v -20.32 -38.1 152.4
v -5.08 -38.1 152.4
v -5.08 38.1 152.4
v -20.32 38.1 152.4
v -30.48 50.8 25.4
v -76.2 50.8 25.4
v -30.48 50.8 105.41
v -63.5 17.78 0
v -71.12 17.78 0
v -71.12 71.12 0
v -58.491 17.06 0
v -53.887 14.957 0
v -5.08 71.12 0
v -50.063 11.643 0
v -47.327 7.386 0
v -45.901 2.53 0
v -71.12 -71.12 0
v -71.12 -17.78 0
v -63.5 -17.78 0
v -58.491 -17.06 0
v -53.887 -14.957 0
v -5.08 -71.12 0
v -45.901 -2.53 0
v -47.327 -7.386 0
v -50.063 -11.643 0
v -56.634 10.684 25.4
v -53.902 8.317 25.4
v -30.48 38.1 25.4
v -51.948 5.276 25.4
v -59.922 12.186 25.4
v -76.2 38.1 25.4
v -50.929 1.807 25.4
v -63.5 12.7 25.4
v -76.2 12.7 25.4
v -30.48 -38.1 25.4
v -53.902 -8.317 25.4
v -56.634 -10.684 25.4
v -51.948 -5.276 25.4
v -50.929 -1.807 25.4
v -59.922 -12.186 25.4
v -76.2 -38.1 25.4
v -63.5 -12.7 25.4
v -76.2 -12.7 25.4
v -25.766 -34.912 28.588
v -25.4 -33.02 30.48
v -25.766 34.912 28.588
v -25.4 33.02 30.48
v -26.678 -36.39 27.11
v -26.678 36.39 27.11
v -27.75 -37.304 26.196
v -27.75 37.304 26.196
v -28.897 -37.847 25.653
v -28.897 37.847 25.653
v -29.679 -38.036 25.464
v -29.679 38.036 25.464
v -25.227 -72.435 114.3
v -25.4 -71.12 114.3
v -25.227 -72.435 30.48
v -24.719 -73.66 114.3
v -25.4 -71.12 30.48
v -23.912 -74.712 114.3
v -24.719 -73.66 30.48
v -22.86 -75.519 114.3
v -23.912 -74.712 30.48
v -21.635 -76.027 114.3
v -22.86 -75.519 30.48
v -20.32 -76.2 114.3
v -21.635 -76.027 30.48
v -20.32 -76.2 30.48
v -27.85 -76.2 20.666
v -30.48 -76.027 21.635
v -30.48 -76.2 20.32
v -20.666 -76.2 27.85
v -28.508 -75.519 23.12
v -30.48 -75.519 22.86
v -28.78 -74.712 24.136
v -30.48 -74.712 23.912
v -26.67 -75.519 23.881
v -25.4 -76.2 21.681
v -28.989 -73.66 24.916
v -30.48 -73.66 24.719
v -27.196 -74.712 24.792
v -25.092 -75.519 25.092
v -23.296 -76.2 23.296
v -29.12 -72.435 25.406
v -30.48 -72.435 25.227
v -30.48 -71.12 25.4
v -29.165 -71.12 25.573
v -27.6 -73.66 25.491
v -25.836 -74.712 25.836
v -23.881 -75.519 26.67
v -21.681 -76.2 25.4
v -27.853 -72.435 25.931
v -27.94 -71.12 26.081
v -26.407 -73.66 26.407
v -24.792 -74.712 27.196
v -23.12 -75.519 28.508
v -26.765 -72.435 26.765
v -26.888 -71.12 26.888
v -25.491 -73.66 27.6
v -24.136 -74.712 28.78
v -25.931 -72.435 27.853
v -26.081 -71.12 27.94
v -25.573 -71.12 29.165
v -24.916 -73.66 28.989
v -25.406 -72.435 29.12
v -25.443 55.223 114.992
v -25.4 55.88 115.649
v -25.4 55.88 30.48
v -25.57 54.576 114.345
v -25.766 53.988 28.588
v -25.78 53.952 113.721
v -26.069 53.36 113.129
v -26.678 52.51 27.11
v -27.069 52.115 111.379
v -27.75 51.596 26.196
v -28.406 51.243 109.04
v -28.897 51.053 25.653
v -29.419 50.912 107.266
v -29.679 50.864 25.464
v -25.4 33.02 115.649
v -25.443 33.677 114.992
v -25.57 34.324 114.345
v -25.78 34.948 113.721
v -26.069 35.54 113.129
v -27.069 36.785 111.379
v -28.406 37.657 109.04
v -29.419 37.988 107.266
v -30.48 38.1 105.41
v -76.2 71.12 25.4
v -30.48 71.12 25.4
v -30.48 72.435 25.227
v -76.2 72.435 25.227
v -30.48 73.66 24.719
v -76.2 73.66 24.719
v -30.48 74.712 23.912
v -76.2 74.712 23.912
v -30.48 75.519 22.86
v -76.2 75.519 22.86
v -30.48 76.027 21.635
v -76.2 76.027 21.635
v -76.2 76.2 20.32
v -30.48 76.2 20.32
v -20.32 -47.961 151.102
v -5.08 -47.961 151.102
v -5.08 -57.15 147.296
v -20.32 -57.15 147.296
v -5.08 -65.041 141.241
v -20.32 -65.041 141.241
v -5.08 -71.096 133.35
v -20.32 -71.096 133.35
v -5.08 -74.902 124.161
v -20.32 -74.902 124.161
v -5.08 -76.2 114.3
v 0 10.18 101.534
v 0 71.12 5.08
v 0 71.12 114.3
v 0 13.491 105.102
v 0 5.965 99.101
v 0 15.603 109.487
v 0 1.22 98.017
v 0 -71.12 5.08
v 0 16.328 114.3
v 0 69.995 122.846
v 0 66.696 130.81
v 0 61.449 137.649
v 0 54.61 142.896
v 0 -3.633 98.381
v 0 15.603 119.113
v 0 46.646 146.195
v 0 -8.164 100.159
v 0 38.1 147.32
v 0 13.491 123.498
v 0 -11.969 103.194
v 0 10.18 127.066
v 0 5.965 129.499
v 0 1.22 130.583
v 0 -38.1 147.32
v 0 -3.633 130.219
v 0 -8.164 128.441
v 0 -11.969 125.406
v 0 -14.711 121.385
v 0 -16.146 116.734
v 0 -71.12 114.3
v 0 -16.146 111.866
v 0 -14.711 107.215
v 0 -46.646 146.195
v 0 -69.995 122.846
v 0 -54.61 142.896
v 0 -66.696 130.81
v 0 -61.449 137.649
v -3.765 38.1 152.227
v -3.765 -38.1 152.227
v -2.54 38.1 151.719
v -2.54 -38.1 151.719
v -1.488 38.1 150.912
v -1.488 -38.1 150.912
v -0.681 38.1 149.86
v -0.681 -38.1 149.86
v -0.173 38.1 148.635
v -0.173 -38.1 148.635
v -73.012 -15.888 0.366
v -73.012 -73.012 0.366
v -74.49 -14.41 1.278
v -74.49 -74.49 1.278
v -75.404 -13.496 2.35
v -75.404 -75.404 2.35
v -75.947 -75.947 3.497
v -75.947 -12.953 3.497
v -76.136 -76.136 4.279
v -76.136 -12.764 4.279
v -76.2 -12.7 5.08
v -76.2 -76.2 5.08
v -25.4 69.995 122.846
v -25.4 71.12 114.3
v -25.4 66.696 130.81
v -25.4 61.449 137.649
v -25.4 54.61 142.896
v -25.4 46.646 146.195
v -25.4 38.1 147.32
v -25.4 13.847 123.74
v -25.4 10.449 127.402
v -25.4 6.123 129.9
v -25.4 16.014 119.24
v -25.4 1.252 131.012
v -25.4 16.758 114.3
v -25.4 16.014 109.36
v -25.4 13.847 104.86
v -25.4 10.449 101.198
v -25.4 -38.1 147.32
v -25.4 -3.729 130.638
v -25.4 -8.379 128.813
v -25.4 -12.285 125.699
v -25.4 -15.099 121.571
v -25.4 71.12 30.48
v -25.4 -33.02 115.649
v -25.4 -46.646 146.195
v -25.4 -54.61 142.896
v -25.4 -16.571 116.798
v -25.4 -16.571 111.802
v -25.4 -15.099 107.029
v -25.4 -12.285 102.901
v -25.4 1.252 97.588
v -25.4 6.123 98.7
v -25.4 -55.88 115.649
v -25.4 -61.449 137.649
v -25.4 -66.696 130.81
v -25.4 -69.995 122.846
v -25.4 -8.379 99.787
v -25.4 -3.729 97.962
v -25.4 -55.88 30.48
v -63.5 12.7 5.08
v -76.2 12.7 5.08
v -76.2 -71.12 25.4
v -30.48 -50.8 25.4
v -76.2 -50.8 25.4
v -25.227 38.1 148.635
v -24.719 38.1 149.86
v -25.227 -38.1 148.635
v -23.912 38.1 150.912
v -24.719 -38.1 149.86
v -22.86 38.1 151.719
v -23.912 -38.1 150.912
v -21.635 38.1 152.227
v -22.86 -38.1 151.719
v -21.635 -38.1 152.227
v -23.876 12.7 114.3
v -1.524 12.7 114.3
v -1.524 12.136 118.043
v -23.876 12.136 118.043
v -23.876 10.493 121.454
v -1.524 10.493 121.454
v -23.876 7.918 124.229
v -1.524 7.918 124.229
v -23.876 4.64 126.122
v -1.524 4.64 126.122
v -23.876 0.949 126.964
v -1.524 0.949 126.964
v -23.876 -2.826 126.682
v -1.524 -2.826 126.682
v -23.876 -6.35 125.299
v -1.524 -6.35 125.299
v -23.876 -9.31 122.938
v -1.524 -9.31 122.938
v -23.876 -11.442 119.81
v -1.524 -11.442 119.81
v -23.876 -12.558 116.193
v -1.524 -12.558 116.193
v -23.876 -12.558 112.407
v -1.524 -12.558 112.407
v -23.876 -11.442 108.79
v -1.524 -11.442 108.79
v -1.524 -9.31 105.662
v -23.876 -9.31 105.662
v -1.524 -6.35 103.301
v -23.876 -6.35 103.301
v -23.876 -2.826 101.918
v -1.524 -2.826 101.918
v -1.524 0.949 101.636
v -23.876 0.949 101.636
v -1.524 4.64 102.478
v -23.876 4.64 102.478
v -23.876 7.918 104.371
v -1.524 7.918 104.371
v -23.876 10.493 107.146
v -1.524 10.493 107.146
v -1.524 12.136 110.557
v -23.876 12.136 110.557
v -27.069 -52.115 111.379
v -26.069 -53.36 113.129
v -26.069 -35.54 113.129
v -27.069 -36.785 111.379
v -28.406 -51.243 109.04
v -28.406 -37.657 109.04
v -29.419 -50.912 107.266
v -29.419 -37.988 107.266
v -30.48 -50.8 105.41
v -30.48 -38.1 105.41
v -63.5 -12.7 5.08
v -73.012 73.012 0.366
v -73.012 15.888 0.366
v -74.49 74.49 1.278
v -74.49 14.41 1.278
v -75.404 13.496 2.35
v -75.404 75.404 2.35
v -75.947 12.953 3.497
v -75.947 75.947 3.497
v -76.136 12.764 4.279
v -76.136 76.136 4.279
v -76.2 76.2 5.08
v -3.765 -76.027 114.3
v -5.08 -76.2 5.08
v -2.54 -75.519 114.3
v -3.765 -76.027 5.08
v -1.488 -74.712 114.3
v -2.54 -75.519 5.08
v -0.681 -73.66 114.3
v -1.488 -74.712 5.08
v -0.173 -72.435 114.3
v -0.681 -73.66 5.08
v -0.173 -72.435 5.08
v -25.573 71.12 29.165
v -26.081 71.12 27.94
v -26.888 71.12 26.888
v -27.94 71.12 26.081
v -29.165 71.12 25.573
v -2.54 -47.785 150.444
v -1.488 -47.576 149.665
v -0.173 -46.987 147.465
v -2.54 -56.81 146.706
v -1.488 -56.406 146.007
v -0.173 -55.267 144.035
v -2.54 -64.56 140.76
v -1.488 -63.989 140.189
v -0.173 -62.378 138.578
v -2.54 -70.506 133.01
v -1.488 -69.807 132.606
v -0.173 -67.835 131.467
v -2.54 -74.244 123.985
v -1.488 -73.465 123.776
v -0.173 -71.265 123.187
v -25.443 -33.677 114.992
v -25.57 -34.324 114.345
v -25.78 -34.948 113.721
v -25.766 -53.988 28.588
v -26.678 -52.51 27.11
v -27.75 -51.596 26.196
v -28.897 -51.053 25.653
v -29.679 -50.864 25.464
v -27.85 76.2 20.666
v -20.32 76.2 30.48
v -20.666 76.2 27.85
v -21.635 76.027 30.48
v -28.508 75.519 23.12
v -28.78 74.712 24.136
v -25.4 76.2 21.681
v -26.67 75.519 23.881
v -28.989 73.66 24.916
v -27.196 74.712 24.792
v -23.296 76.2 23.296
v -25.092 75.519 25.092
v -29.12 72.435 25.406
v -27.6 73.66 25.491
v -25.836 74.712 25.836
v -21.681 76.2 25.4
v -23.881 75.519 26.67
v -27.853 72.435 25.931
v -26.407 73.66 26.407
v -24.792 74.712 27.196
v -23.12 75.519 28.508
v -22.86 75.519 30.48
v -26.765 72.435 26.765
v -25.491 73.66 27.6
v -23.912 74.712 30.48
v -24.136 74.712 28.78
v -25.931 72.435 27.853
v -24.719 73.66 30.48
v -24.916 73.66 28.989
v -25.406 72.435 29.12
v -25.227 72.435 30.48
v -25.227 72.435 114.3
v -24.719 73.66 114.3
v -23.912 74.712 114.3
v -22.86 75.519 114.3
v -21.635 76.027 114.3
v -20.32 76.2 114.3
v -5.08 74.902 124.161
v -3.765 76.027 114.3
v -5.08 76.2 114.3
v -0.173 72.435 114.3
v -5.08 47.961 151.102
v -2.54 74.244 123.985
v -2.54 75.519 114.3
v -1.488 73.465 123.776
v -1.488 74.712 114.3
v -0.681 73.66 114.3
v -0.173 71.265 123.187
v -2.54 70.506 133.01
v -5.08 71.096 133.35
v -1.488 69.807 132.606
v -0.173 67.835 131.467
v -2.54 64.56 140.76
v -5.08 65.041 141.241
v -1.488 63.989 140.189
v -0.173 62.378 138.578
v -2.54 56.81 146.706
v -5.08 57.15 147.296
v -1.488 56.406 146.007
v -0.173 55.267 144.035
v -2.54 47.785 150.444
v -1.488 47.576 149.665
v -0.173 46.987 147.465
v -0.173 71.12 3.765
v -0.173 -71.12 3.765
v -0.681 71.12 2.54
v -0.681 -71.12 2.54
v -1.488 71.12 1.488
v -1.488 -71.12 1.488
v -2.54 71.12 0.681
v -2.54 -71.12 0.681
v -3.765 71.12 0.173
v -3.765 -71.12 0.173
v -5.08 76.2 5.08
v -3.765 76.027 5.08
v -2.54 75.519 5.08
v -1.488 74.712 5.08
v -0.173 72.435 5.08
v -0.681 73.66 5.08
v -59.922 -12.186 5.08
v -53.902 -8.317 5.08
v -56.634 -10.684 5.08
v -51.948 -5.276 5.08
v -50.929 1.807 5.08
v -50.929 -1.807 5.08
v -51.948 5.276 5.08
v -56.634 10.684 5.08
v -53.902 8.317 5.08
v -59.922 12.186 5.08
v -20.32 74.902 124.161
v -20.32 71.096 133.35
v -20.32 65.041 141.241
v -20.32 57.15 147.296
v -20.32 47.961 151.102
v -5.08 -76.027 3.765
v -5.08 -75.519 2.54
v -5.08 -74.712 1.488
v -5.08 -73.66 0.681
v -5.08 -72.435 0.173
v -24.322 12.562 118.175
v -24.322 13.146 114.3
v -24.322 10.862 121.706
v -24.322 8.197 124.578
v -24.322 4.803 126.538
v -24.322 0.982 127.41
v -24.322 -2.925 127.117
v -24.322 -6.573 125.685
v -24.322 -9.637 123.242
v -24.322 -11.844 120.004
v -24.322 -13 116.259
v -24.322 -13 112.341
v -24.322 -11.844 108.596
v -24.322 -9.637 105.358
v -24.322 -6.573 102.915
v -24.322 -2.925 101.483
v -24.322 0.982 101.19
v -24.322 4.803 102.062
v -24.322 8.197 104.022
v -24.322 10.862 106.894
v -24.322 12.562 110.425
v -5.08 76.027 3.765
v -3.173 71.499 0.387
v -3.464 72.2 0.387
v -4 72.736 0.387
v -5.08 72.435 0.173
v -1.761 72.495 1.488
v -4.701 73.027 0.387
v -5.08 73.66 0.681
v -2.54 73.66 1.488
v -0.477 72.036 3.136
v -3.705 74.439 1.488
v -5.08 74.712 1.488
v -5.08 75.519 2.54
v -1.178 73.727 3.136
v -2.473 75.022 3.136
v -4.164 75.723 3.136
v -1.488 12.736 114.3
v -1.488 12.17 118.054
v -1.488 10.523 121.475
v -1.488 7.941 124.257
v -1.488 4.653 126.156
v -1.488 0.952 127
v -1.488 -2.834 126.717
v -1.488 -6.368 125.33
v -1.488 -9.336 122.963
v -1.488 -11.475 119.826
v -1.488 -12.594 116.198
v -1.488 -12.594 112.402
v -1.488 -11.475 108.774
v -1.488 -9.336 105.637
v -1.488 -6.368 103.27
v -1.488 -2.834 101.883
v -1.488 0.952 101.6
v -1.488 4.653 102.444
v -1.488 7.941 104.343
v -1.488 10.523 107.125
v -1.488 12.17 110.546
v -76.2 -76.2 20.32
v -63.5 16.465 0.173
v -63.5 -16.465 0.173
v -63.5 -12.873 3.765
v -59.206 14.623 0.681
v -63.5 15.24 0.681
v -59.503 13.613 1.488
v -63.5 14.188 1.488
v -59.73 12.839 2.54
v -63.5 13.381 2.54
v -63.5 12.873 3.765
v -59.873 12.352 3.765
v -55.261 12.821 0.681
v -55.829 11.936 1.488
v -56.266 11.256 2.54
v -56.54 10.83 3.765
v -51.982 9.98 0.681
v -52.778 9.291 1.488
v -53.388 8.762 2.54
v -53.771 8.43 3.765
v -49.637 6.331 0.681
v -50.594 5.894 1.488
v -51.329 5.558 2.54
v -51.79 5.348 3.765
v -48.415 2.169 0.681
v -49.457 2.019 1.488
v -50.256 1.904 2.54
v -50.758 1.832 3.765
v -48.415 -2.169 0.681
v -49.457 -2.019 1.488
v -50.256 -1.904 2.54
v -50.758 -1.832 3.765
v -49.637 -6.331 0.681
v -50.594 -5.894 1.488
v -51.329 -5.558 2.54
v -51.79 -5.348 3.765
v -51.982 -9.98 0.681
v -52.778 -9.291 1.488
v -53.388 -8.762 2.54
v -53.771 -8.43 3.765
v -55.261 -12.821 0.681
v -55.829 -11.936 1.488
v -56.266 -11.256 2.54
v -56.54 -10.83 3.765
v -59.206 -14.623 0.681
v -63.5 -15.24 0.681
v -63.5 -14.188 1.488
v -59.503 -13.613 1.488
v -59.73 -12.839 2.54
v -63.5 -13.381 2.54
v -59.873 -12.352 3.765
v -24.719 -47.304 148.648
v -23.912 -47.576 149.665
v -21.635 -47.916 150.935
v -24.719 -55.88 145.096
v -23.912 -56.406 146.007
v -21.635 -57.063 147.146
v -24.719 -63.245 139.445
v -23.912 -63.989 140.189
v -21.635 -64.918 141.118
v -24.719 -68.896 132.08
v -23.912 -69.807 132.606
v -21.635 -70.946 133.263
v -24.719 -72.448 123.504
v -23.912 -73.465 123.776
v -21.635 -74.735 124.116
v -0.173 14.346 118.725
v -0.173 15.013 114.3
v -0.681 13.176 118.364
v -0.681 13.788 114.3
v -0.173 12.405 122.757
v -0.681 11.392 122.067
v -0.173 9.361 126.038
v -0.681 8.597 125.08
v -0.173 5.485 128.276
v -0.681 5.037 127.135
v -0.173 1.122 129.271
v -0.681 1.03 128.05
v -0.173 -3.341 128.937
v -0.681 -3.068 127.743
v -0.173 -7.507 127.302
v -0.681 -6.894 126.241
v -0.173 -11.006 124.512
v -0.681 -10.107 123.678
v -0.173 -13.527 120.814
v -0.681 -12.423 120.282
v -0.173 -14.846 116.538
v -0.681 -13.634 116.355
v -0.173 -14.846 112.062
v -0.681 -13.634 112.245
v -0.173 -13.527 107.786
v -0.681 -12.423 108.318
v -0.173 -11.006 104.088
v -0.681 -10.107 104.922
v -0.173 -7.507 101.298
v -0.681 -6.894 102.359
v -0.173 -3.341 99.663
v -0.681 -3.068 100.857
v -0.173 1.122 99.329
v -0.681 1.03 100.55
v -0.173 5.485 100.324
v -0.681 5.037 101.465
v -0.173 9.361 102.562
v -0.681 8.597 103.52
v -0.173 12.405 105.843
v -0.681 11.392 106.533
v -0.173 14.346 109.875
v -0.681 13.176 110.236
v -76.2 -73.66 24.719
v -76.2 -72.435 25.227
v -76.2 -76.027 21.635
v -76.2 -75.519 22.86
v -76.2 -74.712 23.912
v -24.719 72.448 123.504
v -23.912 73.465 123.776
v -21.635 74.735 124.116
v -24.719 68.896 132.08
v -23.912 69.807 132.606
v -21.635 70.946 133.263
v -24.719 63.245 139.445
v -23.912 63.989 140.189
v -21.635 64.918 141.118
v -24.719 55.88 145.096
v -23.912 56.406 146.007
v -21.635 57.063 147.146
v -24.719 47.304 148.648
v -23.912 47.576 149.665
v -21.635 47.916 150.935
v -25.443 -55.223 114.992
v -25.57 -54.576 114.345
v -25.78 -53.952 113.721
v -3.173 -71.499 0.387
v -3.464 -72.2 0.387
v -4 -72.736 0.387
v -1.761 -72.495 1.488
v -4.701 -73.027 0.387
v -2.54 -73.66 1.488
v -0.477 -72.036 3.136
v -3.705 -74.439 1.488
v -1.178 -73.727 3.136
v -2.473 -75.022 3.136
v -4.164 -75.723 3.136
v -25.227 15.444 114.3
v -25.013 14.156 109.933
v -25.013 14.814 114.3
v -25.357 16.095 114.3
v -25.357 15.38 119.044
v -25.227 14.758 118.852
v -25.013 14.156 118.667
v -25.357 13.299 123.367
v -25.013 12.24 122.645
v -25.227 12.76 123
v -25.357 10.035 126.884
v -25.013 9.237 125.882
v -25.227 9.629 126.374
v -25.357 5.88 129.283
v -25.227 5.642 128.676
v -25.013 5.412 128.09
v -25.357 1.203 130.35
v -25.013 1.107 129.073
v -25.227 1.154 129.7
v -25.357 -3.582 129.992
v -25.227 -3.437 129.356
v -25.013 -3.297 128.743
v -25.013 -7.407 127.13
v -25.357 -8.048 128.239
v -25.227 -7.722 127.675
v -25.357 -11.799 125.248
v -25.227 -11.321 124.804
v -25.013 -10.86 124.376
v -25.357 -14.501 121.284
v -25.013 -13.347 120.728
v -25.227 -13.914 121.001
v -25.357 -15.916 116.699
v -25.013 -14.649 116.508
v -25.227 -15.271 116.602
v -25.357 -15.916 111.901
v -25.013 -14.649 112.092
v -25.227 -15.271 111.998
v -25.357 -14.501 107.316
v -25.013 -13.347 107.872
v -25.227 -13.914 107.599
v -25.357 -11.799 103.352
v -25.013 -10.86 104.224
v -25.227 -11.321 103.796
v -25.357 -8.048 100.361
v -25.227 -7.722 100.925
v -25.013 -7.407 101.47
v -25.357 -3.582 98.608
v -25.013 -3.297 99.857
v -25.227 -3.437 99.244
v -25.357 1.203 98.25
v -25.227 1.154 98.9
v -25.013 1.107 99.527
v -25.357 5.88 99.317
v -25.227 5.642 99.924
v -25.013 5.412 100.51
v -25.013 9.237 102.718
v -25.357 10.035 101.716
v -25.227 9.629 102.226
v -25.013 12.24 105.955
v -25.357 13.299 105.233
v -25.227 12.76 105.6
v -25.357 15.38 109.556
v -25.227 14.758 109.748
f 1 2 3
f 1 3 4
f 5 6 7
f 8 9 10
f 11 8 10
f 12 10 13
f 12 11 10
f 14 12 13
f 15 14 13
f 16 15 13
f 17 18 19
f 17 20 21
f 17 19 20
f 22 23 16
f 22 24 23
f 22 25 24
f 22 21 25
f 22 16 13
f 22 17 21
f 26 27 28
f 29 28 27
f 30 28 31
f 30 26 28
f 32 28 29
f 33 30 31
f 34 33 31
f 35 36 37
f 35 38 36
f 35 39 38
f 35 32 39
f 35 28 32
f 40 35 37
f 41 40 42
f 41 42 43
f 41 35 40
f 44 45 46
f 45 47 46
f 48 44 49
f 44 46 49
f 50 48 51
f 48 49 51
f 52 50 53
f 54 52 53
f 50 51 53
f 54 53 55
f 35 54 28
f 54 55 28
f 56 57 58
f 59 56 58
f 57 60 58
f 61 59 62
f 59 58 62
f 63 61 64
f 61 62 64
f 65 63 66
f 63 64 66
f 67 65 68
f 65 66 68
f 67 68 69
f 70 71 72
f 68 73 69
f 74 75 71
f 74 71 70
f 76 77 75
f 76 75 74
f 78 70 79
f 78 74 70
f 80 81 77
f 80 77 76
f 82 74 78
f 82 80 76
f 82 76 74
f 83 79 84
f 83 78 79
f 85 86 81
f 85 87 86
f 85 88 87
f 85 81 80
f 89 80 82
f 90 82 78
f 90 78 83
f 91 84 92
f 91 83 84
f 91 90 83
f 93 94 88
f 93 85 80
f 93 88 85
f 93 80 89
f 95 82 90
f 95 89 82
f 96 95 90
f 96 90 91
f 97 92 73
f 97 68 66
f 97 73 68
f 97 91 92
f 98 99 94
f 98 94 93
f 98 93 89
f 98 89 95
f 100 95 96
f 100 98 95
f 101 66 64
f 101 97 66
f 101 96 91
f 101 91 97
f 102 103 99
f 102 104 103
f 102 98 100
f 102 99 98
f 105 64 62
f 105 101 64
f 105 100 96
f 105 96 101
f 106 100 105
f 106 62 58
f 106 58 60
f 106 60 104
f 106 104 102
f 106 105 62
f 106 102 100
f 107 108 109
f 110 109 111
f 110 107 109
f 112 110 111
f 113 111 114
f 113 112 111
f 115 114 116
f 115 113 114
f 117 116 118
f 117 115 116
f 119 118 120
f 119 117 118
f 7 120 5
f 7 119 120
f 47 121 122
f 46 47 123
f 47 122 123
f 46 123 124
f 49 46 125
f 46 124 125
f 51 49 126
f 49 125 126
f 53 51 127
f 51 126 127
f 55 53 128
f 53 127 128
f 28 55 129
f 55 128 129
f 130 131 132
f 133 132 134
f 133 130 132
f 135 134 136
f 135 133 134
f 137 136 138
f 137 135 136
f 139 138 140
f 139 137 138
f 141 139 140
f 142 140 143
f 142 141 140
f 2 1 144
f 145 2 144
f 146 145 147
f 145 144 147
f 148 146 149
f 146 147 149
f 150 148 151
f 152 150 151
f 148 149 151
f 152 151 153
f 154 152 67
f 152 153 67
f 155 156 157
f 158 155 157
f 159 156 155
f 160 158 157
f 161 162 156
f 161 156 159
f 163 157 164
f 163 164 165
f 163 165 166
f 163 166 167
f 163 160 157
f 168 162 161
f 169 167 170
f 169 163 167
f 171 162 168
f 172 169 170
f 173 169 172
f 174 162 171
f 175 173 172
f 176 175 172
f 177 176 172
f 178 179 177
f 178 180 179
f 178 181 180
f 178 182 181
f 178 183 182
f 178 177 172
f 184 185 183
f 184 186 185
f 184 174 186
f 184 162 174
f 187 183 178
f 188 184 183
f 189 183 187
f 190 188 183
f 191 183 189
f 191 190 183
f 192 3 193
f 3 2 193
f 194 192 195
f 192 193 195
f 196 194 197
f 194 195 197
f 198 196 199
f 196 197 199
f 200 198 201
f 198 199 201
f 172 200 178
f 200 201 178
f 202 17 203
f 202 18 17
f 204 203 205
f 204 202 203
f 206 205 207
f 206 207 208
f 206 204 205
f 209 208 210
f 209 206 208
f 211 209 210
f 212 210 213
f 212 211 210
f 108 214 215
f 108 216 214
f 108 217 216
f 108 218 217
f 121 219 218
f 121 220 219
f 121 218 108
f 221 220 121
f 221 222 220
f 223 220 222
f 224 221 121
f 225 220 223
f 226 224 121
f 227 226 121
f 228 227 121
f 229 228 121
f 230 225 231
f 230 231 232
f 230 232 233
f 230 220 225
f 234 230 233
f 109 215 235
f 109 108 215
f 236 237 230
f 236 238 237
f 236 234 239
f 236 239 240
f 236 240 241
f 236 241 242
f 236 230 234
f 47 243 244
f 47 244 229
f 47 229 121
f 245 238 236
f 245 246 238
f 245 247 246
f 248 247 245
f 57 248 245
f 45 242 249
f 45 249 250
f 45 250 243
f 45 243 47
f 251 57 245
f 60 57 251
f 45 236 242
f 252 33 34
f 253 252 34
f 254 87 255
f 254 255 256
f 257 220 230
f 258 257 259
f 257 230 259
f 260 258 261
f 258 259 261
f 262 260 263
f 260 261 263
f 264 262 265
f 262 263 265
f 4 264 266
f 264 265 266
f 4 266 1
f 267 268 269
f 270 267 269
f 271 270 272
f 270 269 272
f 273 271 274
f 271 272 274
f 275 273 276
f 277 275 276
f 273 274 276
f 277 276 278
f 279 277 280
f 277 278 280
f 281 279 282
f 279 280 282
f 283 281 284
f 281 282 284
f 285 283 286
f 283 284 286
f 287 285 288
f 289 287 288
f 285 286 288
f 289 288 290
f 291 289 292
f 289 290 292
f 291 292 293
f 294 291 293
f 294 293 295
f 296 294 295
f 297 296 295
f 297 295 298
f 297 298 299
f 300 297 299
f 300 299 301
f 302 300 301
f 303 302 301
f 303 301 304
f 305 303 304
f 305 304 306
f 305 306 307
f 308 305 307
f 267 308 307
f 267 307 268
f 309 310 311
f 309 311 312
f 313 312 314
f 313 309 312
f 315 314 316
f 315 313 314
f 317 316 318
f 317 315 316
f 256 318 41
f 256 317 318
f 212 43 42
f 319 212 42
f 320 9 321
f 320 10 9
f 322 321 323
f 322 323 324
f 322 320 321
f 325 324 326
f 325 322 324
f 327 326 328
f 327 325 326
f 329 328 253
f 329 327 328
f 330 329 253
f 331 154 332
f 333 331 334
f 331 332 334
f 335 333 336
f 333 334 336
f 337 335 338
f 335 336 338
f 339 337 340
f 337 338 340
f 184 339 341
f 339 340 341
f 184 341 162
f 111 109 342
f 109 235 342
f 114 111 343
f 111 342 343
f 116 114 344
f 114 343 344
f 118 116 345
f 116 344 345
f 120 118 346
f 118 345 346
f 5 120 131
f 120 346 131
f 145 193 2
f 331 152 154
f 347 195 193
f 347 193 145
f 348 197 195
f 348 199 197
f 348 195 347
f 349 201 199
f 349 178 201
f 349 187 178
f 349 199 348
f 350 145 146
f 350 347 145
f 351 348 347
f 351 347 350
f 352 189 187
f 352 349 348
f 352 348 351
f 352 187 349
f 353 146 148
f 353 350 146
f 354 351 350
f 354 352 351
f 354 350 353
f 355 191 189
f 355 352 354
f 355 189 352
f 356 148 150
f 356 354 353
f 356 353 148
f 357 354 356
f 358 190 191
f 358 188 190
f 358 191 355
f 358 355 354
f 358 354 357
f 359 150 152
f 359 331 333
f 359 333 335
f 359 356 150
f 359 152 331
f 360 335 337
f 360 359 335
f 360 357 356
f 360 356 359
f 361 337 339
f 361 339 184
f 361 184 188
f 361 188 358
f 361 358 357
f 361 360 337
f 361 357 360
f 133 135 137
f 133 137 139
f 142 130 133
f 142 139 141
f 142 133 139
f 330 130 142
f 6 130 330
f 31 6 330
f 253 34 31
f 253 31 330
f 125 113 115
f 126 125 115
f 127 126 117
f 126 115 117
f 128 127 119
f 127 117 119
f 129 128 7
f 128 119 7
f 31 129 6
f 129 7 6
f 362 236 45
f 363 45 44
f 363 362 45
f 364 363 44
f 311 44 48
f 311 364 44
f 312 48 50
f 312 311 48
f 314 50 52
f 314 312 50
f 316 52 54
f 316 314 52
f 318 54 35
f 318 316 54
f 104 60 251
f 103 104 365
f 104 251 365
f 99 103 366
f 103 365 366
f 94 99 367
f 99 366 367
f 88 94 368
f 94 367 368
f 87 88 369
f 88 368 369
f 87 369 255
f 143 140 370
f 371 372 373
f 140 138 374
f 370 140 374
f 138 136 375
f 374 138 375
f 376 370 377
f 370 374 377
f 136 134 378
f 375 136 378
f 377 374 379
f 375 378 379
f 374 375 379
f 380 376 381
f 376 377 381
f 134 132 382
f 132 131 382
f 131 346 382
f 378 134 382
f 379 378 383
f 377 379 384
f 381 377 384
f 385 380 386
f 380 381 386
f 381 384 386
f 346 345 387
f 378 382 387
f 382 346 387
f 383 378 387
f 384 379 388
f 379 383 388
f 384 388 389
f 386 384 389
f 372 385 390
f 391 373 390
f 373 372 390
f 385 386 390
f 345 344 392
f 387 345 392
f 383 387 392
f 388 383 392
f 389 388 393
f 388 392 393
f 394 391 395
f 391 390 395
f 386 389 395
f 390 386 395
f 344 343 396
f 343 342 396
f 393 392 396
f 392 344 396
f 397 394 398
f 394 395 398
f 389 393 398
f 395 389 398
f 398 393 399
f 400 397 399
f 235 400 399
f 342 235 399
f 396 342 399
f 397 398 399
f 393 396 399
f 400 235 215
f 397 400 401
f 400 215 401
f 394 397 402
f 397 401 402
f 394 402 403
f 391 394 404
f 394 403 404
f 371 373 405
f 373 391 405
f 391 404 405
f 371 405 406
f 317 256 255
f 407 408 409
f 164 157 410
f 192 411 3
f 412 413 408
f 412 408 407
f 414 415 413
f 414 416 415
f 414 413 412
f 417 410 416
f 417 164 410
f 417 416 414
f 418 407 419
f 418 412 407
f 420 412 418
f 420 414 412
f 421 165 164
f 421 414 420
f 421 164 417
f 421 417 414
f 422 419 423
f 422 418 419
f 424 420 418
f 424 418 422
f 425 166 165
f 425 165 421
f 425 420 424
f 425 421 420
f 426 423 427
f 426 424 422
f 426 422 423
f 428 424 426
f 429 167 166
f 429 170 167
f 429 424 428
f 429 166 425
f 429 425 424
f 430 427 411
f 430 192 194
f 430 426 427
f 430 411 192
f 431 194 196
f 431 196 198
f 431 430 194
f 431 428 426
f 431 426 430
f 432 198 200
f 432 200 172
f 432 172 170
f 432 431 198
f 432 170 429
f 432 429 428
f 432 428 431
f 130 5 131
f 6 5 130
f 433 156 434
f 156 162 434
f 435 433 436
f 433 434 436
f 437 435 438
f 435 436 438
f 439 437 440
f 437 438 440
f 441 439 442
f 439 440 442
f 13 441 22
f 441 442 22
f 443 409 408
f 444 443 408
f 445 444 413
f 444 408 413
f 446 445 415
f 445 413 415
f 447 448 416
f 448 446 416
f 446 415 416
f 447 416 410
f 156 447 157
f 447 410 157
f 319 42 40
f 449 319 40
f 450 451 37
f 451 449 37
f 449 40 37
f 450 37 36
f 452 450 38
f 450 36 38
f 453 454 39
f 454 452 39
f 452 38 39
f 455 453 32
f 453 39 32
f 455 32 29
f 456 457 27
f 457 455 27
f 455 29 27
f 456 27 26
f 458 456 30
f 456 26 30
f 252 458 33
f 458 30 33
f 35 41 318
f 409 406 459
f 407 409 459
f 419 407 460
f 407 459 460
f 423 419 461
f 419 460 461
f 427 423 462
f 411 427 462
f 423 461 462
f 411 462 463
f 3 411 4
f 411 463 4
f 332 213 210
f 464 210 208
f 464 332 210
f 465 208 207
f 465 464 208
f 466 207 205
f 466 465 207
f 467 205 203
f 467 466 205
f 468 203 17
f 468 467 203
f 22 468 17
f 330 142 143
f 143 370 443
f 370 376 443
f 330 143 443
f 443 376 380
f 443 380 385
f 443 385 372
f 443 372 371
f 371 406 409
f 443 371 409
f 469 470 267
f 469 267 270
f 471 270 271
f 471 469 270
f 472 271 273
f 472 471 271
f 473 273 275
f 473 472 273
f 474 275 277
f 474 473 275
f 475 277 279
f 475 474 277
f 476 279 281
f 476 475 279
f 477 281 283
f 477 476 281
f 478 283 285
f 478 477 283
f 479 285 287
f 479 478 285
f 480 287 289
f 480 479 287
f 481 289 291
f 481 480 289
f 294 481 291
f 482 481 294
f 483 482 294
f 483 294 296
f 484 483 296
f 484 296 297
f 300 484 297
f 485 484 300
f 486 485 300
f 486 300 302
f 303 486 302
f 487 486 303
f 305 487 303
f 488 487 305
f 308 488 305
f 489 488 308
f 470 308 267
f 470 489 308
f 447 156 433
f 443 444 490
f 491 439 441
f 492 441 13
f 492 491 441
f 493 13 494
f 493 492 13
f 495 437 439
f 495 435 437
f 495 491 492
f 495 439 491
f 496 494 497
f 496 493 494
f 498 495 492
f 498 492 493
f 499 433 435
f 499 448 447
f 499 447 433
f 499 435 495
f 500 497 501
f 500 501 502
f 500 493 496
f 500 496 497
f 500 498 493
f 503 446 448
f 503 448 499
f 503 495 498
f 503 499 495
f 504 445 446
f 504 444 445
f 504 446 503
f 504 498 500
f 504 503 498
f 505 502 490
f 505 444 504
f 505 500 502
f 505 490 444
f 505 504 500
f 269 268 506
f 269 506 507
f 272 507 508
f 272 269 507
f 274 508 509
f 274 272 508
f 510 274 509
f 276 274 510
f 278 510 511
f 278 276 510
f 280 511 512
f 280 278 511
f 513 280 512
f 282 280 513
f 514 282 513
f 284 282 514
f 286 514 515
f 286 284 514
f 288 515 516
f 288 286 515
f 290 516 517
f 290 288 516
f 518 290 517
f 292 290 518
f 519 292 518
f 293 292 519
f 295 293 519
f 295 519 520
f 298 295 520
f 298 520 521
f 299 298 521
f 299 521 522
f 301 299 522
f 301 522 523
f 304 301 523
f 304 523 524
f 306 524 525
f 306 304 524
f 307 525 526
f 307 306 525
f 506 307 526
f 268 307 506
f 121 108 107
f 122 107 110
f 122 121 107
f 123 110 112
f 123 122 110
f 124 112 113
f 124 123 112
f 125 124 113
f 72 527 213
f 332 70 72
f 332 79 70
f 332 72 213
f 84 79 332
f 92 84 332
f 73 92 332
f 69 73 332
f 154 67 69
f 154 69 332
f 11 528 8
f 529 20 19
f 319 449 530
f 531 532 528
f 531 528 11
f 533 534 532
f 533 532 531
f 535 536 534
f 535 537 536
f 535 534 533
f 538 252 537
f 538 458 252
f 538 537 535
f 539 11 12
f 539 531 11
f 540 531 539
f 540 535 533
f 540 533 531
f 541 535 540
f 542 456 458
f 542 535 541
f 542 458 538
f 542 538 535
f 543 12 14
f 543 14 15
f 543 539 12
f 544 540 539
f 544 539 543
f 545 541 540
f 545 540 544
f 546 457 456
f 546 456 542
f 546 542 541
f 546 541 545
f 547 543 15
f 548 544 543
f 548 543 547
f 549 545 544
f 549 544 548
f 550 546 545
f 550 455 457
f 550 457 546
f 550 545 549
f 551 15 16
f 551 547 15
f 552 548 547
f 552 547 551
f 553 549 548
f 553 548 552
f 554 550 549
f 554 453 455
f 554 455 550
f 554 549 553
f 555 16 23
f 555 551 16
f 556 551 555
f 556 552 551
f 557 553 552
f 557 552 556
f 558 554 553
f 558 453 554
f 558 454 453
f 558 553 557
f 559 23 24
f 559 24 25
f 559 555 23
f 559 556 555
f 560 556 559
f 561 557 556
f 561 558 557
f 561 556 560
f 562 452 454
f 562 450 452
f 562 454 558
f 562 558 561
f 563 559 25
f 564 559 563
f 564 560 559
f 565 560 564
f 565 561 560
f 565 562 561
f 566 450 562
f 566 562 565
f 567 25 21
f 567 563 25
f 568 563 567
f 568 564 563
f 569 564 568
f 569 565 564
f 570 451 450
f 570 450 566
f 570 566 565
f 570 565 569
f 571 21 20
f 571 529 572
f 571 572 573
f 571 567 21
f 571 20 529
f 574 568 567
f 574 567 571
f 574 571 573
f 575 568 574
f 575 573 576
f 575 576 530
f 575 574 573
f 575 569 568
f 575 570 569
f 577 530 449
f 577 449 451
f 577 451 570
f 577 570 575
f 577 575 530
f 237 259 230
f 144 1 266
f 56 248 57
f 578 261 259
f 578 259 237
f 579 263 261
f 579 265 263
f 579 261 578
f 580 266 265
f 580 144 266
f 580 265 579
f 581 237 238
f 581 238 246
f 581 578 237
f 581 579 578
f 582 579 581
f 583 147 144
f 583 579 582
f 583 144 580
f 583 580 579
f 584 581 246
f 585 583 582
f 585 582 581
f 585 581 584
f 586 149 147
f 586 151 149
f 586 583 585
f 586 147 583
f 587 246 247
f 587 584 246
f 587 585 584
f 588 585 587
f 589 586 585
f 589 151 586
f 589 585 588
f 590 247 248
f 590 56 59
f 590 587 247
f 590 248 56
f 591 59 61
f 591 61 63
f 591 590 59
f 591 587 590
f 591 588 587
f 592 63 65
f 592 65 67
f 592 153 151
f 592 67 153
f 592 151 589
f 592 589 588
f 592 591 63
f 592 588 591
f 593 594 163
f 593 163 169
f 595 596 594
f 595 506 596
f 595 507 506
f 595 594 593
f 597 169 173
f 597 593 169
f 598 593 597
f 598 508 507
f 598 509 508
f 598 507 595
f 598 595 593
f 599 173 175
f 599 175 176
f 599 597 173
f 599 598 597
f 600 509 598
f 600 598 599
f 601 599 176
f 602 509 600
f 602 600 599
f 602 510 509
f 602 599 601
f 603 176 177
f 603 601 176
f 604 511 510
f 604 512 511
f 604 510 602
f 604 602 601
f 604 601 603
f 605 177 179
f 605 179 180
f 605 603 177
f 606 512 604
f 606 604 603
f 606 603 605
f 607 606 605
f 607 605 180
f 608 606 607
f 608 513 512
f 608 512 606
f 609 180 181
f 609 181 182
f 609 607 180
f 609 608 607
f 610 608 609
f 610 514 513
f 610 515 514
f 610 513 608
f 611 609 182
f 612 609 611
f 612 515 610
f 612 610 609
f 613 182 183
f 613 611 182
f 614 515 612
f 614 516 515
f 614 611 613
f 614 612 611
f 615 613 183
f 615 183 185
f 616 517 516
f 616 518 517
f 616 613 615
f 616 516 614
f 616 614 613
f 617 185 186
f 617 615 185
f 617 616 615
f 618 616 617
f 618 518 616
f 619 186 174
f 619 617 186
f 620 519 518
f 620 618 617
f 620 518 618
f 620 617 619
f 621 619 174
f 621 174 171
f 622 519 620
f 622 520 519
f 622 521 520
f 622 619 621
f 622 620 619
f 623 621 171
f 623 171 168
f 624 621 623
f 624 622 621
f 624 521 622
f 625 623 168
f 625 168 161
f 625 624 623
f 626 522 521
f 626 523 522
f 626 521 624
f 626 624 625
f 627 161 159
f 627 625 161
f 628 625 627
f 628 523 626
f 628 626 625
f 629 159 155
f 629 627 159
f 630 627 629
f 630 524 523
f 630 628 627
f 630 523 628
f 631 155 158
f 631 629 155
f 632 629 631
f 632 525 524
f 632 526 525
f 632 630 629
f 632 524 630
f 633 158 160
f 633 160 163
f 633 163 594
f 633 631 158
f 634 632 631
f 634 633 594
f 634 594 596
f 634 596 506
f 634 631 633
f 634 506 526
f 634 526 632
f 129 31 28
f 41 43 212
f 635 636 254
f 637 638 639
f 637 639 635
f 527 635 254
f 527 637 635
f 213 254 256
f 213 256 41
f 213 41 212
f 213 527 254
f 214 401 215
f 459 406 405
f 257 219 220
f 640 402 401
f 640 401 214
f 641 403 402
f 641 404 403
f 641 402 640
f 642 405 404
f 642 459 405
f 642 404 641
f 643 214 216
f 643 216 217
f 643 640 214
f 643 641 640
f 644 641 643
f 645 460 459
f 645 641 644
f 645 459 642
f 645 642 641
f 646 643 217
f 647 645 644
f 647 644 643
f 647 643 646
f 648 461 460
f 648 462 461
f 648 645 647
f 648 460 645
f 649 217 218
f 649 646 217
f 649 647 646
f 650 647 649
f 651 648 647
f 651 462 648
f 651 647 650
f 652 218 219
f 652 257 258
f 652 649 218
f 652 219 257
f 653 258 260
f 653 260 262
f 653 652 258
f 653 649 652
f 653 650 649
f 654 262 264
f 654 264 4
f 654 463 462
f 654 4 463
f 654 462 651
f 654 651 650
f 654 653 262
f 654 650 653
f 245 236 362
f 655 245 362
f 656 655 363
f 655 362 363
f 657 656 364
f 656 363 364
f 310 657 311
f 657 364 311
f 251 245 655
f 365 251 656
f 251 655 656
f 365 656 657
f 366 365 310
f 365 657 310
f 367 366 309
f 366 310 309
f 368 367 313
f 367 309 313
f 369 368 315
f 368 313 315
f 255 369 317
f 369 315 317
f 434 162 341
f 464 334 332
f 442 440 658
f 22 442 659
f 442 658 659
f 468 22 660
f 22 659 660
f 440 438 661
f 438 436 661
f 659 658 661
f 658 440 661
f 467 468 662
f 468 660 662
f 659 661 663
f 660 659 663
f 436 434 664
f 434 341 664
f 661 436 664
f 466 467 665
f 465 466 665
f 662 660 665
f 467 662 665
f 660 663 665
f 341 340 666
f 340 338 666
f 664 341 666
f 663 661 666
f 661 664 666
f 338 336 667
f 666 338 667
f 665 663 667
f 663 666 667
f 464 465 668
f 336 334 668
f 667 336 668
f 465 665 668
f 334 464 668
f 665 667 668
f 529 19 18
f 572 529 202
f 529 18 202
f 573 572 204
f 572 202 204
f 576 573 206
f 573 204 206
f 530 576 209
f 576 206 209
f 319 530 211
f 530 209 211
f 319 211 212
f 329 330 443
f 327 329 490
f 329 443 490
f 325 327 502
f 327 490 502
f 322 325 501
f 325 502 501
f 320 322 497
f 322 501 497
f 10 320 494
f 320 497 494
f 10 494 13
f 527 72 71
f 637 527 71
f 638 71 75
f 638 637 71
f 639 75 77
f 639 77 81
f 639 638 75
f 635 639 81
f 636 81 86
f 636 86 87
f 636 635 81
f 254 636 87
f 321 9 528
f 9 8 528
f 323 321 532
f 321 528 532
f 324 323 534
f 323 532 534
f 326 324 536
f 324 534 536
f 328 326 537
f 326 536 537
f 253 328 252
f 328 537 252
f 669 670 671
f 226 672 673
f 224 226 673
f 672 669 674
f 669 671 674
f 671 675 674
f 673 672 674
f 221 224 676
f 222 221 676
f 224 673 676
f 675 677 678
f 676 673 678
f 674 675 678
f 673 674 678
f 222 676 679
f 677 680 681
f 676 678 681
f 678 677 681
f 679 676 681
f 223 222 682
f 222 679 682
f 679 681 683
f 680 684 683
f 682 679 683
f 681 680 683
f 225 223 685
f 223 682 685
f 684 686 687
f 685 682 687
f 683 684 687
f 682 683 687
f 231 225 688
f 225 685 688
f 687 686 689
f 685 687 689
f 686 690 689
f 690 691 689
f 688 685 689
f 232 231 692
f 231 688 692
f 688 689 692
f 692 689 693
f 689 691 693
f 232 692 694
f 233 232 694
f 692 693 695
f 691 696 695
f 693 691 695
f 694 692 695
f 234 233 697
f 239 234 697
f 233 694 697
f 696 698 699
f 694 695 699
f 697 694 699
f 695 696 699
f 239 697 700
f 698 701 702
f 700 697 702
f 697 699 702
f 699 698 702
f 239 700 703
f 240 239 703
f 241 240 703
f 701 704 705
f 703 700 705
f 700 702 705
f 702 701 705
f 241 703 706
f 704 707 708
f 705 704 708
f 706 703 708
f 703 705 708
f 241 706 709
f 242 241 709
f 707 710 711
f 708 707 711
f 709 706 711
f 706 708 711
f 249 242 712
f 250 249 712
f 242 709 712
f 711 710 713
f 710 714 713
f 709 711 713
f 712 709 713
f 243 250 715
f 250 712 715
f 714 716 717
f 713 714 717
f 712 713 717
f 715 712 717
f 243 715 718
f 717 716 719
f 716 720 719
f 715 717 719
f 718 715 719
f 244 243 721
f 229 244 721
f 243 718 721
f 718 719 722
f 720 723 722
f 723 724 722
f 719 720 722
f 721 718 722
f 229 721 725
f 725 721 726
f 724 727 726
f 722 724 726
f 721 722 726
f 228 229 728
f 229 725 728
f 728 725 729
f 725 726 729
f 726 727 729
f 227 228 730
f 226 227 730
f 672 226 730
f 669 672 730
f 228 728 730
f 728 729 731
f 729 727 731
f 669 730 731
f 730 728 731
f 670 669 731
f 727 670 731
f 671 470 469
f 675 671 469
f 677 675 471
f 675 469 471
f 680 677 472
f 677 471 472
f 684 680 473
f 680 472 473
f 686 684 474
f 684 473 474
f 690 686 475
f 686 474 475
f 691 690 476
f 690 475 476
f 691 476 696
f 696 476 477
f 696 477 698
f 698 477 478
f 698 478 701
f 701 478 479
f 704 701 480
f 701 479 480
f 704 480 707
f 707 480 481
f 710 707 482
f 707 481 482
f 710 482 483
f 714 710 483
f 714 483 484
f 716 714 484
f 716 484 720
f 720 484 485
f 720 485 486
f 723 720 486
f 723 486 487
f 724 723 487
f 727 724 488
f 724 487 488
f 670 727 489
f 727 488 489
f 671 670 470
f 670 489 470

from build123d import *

# Parameters (mm, degrees)
F1_DEPTH  = 76.2
F2_R      = 12.7
F3_DEPTH  = 76.201
F5_DEPTH  = 25.401
F6_R      = 38.1
F7_R      = 38.1
F10_DEPTH = 6.35
F11_SIZE  = 1.524
F12_SIZE  = 1.524
F13_R     = 5.08


# Not quite as in the source:
# - a length typed as a fraction of an inch, garbled in the dataset ("3 / 203.2 mm" for 3/8 in), is restored
# - a pattern or mirror of a feature is missing from the dataset's text; its kind, count and spacing are read off the source's solid


with BuildPart() as f1:
    # F0 (on Front) → F1 (new body, symmetric)
    with BuildSketch(Plane.XZ):
        Polygon((-76.2, 0), (0, 0), (0, 152.4), (-25.4, 152.4), (-25.4, 25.4), (-76.2, 25.4), align=None)
    extrude(amount=F1_DEPTH, both=True)

    # F2 (on face) → F3 (cut, through all)
    with BuildSketch(Plane.YZ):
        with Locations((0, 114.3)):
            Circle(F2_R)
    extrude(amount=-F3_DEPTH, mode=Mode.SUBTRACT)

    # F4 (on face) → F5 (cut, through all)
    with BuildSketch(Plane.XY.offset(25.4)):
        with BuildLine():
            ThreePointArc((-63.5, -12.7), (-50.8, 0), (-63.5, 12.7))
            Line((-63.5, 12.7), (-76.2, 12.7))
            Line((-76.2, 12.7), (-76.2, -12.7))
            Line((-76.2, -12.7), (-63.5, -12.7))
        make_face()
    extrude(amount=-F5_DEPTH, mode=Mode.SUBTRACT)

    # F6
    f6_edges = [f1.edges().sort_by_distance(p)[0] for p in [
        (-12.7, 76.2, 152.4),
    ]]
    fillet(f6_edges, radius=F6_R)

    # F7
    f7_edges = [f1.edges().sort_by_distance(p)[0] for p in [
        (-12.7, -76.2, 152.4),
    ]]
    fillet(f7_edges, radius=F7_R)

    # F9 (on offset) → F10 (join, symmetric)
    with BuildSketch(Plane.XZ.offset(44.45)):
        Polygon((-76.2, 25.4), (-25.4, 25.4), (-25.4, 114.3), align=None)
    f10 = extrude(amount=F10_DEPTH, both=True)

    # F10_copies: F10 across plane
    add(f10.mirror(Plane.ZX))

    # F11
    f11_edges = [f1.edges().sort_by_distance(p)[0] for p in [
        (0, -12.7, 114.3),
        (-12.7, 12.7, 114.3),
        (-25.4, -12.7, 114.3),
    ]]
    chamfer(f11_edges, length=F11_SIZE)

    # F12
    f12_edges = [f1.edges().sort_by_distance(p)[0] for p in [
        (-25.4, -14.224, 114.3),
    ]]
    chamfer(f12_edges, length=F12_SIZE)

    # F13
    f13_edges = [f1.edges().sort_by_distance(p)[0] for p in [
        (-25.4, -15.748, 114.3),
        (-25.4, -65.040768, 141.240768),
        (-25.4, -76.2, 69.85),
        (-25.4, -63.5, 25.4),
        (-25.4, -50.8, 69.85),
        (-25.4, -44.45, 114.3),
        (-25.4, -38.1, 69.85),
        (-25.4, 0, 25.4),
        (-25.4, 38.1, 69.85),
        (-25.4, 44.45, 114.3),
        (-25.4, 50.8, 69.85),
        (-25.4, 63.5, 25.4),
        (-25.4, 76.2, 69.85),
        (-25.4, 65.040768, 141.240768),
        (-25.4, 0, 152.4),
        (-12.7, -38.1, 152.4),
        (-12.7, 38.1, 152.4),
        (0, 0, 152.4),
        (0, 65.040768, 141.240768),
        (-12.7, 76.2, 114.3),
        (0, -65.040768, 141.240768),
        (-12.7, -76.2, 114.3),
        (0, -14.224, 114.3),
        (0, -76.2, 57.15),
        (0, 76.2, 57.15),
        (0, 0, 0),
        (-76.2, 44.45, 0),
        (-69.85, 12.7, 0),
        (-50.8, 0, 0),
        (-69.85, -12.7, 0),
        (-76.2, -44.45, 0),
        (-38.1, -76.2, 0),
        (-38.1, 76.2, 0),
        (-50.8, -76.2, 25.4),
        (-50.8, 76.2, 25.4),
    ]]
    fillet(f13_edges, radius=F13_R)


solid = f1.part
